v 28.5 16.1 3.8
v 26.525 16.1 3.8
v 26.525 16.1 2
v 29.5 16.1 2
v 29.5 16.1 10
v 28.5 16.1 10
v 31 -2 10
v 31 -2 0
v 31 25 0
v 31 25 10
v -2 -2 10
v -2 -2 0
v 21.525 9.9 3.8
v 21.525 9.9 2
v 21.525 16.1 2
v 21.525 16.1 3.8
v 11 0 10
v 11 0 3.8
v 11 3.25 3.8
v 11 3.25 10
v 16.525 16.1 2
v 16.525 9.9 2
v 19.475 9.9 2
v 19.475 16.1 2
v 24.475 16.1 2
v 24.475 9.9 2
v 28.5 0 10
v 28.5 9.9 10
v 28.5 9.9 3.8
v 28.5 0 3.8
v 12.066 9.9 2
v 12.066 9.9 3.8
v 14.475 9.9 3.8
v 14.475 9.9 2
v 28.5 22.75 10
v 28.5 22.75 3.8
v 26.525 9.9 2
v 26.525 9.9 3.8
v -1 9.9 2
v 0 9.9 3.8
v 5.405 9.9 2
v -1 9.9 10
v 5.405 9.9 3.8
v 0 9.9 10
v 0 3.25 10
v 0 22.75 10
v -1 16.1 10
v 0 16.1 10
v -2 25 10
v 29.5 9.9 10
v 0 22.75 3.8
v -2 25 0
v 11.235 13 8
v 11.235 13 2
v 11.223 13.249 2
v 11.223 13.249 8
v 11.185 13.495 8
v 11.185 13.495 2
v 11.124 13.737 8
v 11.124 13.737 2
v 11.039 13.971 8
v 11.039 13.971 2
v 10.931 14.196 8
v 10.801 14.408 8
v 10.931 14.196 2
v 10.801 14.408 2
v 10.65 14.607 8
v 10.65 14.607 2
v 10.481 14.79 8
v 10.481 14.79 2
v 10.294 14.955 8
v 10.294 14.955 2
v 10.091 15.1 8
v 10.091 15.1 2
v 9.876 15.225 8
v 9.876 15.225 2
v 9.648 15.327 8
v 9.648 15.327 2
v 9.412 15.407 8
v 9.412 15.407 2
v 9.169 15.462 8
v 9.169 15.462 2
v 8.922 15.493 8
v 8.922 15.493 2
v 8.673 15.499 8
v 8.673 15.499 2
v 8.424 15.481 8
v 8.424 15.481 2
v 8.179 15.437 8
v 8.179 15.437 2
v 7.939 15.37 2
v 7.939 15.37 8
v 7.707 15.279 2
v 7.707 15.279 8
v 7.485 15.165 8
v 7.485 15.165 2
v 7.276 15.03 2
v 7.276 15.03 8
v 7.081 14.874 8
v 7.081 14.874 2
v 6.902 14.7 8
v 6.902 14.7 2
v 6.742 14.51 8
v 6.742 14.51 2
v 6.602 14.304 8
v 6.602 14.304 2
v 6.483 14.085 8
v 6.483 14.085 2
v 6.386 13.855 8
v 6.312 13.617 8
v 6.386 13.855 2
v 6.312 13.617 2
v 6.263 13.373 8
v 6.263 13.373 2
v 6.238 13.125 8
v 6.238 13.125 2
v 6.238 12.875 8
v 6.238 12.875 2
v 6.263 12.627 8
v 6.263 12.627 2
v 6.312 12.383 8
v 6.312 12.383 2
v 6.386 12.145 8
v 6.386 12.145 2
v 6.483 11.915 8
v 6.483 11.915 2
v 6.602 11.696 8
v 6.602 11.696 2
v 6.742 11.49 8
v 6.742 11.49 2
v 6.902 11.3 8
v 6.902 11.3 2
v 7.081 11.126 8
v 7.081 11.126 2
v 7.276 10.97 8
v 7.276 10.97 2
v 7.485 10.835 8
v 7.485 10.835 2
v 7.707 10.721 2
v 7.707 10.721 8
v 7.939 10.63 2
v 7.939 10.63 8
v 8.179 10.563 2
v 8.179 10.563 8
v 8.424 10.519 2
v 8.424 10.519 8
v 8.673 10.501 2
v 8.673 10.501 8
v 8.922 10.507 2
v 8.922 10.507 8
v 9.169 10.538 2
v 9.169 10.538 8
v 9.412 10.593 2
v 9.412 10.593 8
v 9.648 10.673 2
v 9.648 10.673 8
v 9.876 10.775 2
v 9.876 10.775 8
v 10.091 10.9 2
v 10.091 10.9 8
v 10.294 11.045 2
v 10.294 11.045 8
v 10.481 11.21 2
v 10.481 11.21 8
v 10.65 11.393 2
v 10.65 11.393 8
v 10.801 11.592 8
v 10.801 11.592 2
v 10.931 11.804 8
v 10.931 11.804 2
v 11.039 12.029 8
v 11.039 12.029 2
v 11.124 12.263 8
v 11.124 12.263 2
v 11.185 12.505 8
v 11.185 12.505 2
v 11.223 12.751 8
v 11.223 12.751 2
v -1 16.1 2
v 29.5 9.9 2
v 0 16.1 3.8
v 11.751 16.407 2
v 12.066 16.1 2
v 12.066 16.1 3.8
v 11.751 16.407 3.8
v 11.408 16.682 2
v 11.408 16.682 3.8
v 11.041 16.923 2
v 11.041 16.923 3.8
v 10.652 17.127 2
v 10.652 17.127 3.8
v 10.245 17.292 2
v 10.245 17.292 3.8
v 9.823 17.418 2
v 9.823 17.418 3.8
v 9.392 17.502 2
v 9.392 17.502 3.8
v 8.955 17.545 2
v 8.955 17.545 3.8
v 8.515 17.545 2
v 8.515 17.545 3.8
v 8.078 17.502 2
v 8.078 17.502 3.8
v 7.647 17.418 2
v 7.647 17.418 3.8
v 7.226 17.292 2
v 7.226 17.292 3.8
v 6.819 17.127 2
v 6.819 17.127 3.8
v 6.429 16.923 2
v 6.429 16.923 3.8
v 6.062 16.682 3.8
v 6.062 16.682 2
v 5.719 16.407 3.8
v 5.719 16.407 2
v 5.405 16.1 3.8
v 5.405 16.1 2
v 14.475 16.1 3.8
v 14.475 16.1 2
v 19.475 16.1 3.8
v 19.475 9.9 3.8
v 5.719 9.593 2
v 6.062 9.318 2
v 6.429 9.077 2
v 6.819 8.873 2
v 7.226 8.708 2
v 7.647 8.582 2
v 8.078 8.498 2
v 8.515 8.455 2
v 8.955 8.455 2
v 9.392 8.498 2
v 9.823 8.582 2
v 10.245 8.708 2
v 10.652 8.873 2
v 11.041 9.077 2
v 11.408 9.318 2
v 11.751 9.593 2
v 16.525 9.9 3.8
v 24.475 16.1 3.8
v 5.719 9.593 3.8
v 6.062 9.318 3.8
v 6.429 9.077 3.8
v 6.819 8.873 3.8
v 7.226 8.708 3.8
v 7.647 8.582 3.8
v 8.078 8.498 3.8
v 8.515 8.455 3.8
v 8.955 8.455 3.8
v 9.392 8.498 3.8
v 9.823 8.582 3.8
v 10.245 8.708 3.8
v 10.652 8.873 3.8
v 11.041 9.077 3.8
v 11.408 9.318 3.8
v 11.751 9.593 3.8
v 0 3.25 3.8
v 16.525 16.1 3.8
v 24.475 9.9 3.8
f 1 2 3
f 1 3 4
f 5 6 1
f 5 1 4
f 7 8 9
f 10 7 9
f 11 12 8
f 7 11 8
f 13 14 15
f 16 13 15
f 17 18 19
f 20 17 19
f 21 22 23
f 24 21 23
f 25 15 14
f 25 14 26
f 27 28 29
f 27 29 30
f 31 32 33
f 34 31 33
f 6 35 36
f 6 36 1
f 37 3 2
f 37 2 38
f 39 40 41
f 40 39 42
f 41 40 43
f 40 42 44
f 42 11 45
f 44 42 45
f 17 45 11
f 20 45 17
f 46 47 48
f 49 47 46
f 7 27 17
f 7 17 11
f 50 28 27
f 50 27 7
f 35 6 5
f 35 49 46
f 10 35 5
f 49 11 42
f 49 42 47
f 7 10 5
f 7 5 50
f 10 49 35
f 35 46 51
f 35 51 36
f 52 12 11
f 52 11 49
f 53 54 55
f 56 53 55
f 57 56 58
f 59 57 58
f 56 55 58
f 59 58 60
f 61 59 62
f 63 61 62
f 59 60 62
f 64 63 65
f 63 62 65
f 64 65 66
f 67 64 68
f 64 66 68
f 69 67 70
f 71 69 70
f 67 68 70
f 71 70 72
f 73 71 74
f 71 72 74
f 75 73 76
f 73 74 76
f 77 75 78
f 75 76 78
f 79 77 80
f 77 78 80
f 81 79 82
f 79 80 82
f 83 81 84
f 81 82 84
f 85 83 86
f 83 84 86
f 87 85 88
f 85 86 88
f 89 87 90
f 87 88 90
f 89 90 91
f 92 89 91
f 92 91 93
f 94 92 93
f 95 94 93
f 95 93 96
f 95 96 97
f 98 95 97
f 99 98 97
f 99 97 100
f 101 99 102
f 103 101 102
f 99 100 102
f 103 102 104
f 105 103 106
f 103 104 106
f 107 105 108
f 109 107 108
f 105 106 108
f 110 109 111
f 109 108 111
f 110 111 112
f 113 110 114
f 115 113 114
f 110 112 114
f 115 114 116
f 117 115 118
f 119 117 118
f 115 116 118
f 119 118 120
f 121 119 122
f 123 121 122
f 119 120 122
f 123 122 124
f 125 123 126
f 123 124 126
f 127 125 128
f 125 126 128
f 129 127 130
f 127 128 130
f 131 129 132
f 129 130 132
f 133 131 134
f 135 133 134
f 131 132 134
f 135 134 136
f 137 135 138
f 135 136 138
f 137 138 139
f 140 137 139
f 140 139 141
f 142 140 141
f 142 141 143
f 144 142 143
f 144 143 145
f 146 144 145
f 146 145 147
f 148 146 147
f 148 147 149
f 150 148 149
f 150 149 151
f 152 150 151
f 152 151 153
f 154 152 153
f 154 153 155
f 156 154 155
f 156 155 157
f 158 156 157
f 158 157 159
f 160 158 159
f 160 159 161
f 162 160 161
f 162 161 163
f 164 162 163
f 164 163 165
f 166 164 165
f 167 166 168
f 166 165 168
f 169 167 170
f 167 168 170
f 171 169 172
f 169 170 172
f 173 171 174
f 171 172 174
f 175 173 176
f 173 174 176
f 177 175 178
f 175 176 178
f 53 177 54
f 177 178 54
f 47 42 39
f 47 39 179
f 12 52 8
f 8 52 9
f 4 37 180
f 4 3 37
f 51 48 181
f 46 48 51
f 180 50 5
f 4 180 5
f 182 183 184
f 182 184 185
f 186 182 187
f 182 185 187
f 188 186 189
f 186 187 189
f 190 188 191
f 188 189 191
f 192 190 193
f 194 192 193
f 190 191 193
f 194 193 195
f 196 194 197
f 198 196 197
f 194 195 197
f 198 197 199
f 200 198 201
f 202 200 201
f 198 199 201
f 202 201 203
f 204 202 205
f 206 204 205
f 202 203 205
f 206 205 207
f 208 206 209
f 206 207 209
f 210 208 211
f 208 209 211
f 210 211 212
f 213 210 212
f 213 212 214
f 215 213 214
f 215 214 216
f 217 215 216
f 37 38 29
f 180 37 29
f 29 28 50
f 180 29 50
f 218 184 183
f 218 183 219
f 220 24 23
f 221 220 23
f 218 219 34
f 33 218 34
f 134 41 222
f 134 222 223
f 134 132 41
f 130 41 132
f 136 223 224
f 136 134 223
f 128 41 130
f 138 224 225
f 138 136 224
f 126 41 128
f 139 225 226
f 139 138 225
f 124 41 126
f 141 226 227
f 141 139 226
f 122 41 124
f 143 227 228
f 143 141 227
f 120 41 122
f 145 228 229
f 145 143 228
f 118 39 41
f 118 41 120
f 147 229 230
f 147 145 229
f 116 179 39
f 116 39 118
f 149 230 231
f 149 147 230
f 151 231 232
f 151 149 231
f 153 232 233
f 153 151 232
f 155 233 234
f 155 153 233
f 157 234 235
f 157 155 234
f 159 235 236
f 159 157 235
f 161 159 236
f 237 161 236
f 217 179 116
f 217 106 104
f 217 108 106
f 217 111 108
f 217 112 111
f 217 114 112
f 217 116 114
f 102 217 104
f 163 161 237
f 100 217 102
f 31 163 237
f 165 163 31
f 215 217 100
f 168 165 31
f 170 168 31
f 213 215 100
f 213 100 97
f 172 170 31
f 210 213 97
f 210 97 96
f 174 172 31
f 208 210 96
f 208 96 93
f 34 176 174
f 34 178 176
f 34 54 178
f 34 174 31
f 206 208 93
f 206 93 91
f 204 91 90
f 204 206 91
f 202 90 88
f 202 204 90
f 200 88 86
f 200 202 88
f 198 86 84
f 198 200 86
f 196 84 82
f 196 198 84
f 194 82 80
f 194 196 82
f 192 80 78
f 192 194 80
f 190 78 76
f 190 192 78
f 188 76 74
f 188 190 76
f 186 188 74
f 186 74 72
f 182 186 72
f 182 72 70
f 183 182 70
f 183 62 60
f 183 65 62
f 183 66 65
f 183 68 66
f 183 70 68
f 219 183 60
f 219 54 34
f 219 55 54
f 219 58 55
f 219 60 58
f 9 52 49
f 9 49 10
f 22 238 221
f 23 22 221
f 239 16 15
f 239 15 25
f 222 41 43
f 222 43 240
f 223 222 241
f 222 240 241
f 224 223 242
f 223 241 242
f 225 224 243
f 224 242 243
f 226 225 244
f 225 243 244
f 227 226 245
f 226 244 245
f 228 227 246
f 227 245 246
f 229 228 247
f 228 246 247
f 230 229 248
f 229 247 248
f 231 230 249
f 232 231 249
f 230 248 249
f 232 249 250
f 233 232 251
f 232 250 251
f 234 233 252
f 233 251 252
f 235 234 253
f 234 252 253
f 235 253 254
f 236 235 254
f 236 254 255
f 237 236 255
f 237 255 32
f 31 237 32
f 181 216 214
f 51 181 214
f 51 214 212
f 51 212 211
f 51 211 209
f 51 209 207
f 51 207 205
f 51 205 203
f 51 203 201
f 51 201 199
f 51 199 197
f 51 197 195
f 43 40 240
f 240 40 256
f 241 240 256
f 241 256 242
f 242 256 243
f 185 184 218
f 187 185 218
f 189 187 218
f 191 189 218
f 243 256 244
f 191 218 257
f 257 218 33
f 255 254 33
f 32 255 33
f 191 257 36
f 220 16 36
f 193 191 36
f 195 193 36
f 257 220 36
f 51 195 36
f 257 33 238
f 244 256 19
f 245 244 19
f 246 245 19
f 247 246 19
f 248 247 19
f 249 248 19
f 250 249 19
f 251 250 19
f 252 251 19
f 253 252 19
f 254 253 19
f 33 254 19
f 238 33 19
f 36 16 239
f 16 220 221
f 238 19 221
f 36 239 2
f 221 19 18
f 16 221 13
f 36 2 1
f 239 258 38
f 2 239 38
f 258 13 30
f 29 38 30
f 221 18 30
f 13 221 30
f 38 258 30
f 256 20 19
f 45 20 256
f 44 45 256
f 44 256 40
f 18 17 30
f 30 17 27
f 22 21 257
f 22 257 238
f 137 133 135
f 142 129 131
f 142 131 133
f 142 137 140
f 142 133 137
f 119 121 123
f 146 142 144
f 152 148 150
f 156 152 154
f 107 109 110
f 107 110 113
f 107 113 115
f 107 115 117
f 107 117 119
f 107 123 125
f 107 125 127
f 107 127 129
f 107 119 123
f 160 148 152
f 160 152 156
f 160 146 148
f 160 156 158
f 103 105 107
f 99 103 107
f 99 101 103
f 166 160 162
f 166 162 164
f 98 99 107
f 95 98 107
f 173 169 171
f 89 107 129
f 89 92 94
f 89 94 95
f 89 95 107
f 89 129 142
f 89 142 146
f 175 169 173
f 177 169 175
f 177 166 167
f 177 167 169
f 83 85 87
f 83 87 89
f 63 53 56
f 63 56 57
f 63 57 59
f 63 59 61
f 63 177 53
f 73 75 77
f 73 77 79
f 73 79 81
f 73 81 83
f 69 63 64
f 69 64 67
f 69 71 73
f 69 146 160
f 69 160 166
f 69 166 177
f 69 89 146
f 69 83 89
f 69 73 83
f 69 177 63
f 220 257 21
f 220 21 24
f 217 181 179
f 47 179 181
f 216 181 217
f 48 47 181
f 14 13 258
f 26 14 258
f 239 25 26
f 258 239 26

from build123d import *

# Parameters (mm, degrees)
PAD004_DEPTH             = 8.2
SKETCH014_W              = 28.5
SKETCH014_H              = 6.2
PAD005_DEPTH             = 1.8
SKETCH015_R              = 2.9
POCKET004_DEPTH          = 0.6
SKETCH016_W              = 2.05
SKETCH016_H              = 6.2
POCKET005_DEPTH          = 1.8
CLONE012_PLACEMENT_ANGLE = 180
BOX_W                    = 33
BOX_H                    = 27
BOX_DEPTH                = 10
SKETCH_W                 = 3
SKETCH_H                 = 3.25
POCKET009_DEPTH          = 6.2
SKETCH021_W              = 1
SKETCH021_H              = 6.2
POCKET010_DEPTH          = 8
SKETCH022_R              = 4.55
POCKET011_DEPTH          = 1.8
SKETCH023_R              = 2.5
PAD_DEPTH                = 6


with BuildPart() as body011:
    # Sketch013 → Pad004 (new body)
    with BuildSketch(Plane.XY):
        with BuildLine():
            Line((0, 0), (28.5, 0))
            Line((28.5, 0), (28.5, 22.75))
            Line((28.5, 22.75), (14, 22.75))
            Line((14, 22.75), (14, 22.5))
            ThreePointArc((11, 19.5), (13.12132, 20.37868), (14, 22.5))
            Line((11, 19.5), (0, 19.5))
            Line((0, 19.5), (0, 0))
        make_face()
    extrude(amount=PAD004_DEPTH)

    # Sketch014 (on Face9 of Pad004) → Pad005 (join)
    with BuildSketch(Plane.XY.offset(8.2)):
        with Locations((14.25, 9.75)):
            Rectangle(SKETCH014_W, SKETCH014_H)
    extrude(amount=PAD005_DEPTH)

    # Sketch015 (on Face11 of Pad005) → Pocket004 (cut)
    with BuildSketch(Plane.XY.offset(10)):
        with Locations((8.735056, 9.75)):
            Circle(SKETCH015_R)
    extrude(amount=-POCKET004_DEPTH, mode=Mode.SUBTRACT)

    # Sketch016 (on Face10 of Pocket004) → Pocket005 (cut)
    with BuildSketch(Plane.XY.offset(10)):
        with Locations((15.5, 9.75)):
            Rectangle(SKETCH016_W, SKETCH016_H)
        Polygon((21.525, 12.85), (21.525, 6.65), (19.475, 6.65), (19.475, 12.85), (20.5, 12.85), align=None)
        with Locations((25.5, 9.75)):
            Rectangle(SKETCH016_W, SKETCH016_H)
    extrude(amount=-POCKET005_DEPTH, mode=Mode.SUBTRACT)


with BuildPart() as body011_1:
    # Clone012 placement: moved
    add(body011.part.moved(Location((0, 22.75, 12))).rotate(Axis((0, 22.75, 12), (1, 0, 0)), CLONE012_PLACEMENT_ANGLE))


with BuildPart() as model_body012:
    # Box → Box (new body)
    with BuildSketch(Plane(origin=(-2, -2, 0), x_dir=(1, 0, 0), z_dir=(0, 0, 1))):
        with Locations((16.5, 13.5)):
            Rectangle(BOX_W, BOX_H)
    extrude(amount=BOX_DEPTH)

    # Cut: cut Body011
    add(body011_1.part, mode=Mode.SUBTRACT)

    # Sketch (on Face3 of BaseFeature001) → Pocket009 (cut)
    with BuildSketch(Plane.XY.offset(10)):
        with Locations((12.5, 1.625)):
            Rectangle(SKETCH_W, SKETCH_H)
    extrude(amount=-POCKET009_DEPTH, mode=Mode.SUBTRACT)

    # Sketch021 (on Face3 of Pocket009) → Pocket010 (cut)
    with BuildSketch(Plane.XY.offset(10)):
        with Locations((-0.5, 13)):
            Rectangle(SKETCH021_W, SKETCH021_H)
        with Locations((29, 13)):
            Rectangle(SKETCH021_W, SKETCH021_H)
    extrude(amount=-POCKET010_DEPTH, mode=Mode.SUBTRACT)

    # Sketch022 (on Face17 of Pocket010) → Pocket011 (cut)
    with BuildSketch(Plane.XY.offset(3.8)):
        with Locations((8.735056, 13)):
            Circle(SKETCH022_R)
    extrude(amount=-POCKET011_DEPTH, mode=Mode.SUBTRACT)

    # Sketch023 (on Face39 of Pocket011) → Pad (join)
    with BuildSketch(Plane.XY.offset(2)):
        with Locations((8.735056, 13)):
            Circle(SKETCH023_R)
    extrude(amount=PAD_DEPTH)


solid = model_body012.part
